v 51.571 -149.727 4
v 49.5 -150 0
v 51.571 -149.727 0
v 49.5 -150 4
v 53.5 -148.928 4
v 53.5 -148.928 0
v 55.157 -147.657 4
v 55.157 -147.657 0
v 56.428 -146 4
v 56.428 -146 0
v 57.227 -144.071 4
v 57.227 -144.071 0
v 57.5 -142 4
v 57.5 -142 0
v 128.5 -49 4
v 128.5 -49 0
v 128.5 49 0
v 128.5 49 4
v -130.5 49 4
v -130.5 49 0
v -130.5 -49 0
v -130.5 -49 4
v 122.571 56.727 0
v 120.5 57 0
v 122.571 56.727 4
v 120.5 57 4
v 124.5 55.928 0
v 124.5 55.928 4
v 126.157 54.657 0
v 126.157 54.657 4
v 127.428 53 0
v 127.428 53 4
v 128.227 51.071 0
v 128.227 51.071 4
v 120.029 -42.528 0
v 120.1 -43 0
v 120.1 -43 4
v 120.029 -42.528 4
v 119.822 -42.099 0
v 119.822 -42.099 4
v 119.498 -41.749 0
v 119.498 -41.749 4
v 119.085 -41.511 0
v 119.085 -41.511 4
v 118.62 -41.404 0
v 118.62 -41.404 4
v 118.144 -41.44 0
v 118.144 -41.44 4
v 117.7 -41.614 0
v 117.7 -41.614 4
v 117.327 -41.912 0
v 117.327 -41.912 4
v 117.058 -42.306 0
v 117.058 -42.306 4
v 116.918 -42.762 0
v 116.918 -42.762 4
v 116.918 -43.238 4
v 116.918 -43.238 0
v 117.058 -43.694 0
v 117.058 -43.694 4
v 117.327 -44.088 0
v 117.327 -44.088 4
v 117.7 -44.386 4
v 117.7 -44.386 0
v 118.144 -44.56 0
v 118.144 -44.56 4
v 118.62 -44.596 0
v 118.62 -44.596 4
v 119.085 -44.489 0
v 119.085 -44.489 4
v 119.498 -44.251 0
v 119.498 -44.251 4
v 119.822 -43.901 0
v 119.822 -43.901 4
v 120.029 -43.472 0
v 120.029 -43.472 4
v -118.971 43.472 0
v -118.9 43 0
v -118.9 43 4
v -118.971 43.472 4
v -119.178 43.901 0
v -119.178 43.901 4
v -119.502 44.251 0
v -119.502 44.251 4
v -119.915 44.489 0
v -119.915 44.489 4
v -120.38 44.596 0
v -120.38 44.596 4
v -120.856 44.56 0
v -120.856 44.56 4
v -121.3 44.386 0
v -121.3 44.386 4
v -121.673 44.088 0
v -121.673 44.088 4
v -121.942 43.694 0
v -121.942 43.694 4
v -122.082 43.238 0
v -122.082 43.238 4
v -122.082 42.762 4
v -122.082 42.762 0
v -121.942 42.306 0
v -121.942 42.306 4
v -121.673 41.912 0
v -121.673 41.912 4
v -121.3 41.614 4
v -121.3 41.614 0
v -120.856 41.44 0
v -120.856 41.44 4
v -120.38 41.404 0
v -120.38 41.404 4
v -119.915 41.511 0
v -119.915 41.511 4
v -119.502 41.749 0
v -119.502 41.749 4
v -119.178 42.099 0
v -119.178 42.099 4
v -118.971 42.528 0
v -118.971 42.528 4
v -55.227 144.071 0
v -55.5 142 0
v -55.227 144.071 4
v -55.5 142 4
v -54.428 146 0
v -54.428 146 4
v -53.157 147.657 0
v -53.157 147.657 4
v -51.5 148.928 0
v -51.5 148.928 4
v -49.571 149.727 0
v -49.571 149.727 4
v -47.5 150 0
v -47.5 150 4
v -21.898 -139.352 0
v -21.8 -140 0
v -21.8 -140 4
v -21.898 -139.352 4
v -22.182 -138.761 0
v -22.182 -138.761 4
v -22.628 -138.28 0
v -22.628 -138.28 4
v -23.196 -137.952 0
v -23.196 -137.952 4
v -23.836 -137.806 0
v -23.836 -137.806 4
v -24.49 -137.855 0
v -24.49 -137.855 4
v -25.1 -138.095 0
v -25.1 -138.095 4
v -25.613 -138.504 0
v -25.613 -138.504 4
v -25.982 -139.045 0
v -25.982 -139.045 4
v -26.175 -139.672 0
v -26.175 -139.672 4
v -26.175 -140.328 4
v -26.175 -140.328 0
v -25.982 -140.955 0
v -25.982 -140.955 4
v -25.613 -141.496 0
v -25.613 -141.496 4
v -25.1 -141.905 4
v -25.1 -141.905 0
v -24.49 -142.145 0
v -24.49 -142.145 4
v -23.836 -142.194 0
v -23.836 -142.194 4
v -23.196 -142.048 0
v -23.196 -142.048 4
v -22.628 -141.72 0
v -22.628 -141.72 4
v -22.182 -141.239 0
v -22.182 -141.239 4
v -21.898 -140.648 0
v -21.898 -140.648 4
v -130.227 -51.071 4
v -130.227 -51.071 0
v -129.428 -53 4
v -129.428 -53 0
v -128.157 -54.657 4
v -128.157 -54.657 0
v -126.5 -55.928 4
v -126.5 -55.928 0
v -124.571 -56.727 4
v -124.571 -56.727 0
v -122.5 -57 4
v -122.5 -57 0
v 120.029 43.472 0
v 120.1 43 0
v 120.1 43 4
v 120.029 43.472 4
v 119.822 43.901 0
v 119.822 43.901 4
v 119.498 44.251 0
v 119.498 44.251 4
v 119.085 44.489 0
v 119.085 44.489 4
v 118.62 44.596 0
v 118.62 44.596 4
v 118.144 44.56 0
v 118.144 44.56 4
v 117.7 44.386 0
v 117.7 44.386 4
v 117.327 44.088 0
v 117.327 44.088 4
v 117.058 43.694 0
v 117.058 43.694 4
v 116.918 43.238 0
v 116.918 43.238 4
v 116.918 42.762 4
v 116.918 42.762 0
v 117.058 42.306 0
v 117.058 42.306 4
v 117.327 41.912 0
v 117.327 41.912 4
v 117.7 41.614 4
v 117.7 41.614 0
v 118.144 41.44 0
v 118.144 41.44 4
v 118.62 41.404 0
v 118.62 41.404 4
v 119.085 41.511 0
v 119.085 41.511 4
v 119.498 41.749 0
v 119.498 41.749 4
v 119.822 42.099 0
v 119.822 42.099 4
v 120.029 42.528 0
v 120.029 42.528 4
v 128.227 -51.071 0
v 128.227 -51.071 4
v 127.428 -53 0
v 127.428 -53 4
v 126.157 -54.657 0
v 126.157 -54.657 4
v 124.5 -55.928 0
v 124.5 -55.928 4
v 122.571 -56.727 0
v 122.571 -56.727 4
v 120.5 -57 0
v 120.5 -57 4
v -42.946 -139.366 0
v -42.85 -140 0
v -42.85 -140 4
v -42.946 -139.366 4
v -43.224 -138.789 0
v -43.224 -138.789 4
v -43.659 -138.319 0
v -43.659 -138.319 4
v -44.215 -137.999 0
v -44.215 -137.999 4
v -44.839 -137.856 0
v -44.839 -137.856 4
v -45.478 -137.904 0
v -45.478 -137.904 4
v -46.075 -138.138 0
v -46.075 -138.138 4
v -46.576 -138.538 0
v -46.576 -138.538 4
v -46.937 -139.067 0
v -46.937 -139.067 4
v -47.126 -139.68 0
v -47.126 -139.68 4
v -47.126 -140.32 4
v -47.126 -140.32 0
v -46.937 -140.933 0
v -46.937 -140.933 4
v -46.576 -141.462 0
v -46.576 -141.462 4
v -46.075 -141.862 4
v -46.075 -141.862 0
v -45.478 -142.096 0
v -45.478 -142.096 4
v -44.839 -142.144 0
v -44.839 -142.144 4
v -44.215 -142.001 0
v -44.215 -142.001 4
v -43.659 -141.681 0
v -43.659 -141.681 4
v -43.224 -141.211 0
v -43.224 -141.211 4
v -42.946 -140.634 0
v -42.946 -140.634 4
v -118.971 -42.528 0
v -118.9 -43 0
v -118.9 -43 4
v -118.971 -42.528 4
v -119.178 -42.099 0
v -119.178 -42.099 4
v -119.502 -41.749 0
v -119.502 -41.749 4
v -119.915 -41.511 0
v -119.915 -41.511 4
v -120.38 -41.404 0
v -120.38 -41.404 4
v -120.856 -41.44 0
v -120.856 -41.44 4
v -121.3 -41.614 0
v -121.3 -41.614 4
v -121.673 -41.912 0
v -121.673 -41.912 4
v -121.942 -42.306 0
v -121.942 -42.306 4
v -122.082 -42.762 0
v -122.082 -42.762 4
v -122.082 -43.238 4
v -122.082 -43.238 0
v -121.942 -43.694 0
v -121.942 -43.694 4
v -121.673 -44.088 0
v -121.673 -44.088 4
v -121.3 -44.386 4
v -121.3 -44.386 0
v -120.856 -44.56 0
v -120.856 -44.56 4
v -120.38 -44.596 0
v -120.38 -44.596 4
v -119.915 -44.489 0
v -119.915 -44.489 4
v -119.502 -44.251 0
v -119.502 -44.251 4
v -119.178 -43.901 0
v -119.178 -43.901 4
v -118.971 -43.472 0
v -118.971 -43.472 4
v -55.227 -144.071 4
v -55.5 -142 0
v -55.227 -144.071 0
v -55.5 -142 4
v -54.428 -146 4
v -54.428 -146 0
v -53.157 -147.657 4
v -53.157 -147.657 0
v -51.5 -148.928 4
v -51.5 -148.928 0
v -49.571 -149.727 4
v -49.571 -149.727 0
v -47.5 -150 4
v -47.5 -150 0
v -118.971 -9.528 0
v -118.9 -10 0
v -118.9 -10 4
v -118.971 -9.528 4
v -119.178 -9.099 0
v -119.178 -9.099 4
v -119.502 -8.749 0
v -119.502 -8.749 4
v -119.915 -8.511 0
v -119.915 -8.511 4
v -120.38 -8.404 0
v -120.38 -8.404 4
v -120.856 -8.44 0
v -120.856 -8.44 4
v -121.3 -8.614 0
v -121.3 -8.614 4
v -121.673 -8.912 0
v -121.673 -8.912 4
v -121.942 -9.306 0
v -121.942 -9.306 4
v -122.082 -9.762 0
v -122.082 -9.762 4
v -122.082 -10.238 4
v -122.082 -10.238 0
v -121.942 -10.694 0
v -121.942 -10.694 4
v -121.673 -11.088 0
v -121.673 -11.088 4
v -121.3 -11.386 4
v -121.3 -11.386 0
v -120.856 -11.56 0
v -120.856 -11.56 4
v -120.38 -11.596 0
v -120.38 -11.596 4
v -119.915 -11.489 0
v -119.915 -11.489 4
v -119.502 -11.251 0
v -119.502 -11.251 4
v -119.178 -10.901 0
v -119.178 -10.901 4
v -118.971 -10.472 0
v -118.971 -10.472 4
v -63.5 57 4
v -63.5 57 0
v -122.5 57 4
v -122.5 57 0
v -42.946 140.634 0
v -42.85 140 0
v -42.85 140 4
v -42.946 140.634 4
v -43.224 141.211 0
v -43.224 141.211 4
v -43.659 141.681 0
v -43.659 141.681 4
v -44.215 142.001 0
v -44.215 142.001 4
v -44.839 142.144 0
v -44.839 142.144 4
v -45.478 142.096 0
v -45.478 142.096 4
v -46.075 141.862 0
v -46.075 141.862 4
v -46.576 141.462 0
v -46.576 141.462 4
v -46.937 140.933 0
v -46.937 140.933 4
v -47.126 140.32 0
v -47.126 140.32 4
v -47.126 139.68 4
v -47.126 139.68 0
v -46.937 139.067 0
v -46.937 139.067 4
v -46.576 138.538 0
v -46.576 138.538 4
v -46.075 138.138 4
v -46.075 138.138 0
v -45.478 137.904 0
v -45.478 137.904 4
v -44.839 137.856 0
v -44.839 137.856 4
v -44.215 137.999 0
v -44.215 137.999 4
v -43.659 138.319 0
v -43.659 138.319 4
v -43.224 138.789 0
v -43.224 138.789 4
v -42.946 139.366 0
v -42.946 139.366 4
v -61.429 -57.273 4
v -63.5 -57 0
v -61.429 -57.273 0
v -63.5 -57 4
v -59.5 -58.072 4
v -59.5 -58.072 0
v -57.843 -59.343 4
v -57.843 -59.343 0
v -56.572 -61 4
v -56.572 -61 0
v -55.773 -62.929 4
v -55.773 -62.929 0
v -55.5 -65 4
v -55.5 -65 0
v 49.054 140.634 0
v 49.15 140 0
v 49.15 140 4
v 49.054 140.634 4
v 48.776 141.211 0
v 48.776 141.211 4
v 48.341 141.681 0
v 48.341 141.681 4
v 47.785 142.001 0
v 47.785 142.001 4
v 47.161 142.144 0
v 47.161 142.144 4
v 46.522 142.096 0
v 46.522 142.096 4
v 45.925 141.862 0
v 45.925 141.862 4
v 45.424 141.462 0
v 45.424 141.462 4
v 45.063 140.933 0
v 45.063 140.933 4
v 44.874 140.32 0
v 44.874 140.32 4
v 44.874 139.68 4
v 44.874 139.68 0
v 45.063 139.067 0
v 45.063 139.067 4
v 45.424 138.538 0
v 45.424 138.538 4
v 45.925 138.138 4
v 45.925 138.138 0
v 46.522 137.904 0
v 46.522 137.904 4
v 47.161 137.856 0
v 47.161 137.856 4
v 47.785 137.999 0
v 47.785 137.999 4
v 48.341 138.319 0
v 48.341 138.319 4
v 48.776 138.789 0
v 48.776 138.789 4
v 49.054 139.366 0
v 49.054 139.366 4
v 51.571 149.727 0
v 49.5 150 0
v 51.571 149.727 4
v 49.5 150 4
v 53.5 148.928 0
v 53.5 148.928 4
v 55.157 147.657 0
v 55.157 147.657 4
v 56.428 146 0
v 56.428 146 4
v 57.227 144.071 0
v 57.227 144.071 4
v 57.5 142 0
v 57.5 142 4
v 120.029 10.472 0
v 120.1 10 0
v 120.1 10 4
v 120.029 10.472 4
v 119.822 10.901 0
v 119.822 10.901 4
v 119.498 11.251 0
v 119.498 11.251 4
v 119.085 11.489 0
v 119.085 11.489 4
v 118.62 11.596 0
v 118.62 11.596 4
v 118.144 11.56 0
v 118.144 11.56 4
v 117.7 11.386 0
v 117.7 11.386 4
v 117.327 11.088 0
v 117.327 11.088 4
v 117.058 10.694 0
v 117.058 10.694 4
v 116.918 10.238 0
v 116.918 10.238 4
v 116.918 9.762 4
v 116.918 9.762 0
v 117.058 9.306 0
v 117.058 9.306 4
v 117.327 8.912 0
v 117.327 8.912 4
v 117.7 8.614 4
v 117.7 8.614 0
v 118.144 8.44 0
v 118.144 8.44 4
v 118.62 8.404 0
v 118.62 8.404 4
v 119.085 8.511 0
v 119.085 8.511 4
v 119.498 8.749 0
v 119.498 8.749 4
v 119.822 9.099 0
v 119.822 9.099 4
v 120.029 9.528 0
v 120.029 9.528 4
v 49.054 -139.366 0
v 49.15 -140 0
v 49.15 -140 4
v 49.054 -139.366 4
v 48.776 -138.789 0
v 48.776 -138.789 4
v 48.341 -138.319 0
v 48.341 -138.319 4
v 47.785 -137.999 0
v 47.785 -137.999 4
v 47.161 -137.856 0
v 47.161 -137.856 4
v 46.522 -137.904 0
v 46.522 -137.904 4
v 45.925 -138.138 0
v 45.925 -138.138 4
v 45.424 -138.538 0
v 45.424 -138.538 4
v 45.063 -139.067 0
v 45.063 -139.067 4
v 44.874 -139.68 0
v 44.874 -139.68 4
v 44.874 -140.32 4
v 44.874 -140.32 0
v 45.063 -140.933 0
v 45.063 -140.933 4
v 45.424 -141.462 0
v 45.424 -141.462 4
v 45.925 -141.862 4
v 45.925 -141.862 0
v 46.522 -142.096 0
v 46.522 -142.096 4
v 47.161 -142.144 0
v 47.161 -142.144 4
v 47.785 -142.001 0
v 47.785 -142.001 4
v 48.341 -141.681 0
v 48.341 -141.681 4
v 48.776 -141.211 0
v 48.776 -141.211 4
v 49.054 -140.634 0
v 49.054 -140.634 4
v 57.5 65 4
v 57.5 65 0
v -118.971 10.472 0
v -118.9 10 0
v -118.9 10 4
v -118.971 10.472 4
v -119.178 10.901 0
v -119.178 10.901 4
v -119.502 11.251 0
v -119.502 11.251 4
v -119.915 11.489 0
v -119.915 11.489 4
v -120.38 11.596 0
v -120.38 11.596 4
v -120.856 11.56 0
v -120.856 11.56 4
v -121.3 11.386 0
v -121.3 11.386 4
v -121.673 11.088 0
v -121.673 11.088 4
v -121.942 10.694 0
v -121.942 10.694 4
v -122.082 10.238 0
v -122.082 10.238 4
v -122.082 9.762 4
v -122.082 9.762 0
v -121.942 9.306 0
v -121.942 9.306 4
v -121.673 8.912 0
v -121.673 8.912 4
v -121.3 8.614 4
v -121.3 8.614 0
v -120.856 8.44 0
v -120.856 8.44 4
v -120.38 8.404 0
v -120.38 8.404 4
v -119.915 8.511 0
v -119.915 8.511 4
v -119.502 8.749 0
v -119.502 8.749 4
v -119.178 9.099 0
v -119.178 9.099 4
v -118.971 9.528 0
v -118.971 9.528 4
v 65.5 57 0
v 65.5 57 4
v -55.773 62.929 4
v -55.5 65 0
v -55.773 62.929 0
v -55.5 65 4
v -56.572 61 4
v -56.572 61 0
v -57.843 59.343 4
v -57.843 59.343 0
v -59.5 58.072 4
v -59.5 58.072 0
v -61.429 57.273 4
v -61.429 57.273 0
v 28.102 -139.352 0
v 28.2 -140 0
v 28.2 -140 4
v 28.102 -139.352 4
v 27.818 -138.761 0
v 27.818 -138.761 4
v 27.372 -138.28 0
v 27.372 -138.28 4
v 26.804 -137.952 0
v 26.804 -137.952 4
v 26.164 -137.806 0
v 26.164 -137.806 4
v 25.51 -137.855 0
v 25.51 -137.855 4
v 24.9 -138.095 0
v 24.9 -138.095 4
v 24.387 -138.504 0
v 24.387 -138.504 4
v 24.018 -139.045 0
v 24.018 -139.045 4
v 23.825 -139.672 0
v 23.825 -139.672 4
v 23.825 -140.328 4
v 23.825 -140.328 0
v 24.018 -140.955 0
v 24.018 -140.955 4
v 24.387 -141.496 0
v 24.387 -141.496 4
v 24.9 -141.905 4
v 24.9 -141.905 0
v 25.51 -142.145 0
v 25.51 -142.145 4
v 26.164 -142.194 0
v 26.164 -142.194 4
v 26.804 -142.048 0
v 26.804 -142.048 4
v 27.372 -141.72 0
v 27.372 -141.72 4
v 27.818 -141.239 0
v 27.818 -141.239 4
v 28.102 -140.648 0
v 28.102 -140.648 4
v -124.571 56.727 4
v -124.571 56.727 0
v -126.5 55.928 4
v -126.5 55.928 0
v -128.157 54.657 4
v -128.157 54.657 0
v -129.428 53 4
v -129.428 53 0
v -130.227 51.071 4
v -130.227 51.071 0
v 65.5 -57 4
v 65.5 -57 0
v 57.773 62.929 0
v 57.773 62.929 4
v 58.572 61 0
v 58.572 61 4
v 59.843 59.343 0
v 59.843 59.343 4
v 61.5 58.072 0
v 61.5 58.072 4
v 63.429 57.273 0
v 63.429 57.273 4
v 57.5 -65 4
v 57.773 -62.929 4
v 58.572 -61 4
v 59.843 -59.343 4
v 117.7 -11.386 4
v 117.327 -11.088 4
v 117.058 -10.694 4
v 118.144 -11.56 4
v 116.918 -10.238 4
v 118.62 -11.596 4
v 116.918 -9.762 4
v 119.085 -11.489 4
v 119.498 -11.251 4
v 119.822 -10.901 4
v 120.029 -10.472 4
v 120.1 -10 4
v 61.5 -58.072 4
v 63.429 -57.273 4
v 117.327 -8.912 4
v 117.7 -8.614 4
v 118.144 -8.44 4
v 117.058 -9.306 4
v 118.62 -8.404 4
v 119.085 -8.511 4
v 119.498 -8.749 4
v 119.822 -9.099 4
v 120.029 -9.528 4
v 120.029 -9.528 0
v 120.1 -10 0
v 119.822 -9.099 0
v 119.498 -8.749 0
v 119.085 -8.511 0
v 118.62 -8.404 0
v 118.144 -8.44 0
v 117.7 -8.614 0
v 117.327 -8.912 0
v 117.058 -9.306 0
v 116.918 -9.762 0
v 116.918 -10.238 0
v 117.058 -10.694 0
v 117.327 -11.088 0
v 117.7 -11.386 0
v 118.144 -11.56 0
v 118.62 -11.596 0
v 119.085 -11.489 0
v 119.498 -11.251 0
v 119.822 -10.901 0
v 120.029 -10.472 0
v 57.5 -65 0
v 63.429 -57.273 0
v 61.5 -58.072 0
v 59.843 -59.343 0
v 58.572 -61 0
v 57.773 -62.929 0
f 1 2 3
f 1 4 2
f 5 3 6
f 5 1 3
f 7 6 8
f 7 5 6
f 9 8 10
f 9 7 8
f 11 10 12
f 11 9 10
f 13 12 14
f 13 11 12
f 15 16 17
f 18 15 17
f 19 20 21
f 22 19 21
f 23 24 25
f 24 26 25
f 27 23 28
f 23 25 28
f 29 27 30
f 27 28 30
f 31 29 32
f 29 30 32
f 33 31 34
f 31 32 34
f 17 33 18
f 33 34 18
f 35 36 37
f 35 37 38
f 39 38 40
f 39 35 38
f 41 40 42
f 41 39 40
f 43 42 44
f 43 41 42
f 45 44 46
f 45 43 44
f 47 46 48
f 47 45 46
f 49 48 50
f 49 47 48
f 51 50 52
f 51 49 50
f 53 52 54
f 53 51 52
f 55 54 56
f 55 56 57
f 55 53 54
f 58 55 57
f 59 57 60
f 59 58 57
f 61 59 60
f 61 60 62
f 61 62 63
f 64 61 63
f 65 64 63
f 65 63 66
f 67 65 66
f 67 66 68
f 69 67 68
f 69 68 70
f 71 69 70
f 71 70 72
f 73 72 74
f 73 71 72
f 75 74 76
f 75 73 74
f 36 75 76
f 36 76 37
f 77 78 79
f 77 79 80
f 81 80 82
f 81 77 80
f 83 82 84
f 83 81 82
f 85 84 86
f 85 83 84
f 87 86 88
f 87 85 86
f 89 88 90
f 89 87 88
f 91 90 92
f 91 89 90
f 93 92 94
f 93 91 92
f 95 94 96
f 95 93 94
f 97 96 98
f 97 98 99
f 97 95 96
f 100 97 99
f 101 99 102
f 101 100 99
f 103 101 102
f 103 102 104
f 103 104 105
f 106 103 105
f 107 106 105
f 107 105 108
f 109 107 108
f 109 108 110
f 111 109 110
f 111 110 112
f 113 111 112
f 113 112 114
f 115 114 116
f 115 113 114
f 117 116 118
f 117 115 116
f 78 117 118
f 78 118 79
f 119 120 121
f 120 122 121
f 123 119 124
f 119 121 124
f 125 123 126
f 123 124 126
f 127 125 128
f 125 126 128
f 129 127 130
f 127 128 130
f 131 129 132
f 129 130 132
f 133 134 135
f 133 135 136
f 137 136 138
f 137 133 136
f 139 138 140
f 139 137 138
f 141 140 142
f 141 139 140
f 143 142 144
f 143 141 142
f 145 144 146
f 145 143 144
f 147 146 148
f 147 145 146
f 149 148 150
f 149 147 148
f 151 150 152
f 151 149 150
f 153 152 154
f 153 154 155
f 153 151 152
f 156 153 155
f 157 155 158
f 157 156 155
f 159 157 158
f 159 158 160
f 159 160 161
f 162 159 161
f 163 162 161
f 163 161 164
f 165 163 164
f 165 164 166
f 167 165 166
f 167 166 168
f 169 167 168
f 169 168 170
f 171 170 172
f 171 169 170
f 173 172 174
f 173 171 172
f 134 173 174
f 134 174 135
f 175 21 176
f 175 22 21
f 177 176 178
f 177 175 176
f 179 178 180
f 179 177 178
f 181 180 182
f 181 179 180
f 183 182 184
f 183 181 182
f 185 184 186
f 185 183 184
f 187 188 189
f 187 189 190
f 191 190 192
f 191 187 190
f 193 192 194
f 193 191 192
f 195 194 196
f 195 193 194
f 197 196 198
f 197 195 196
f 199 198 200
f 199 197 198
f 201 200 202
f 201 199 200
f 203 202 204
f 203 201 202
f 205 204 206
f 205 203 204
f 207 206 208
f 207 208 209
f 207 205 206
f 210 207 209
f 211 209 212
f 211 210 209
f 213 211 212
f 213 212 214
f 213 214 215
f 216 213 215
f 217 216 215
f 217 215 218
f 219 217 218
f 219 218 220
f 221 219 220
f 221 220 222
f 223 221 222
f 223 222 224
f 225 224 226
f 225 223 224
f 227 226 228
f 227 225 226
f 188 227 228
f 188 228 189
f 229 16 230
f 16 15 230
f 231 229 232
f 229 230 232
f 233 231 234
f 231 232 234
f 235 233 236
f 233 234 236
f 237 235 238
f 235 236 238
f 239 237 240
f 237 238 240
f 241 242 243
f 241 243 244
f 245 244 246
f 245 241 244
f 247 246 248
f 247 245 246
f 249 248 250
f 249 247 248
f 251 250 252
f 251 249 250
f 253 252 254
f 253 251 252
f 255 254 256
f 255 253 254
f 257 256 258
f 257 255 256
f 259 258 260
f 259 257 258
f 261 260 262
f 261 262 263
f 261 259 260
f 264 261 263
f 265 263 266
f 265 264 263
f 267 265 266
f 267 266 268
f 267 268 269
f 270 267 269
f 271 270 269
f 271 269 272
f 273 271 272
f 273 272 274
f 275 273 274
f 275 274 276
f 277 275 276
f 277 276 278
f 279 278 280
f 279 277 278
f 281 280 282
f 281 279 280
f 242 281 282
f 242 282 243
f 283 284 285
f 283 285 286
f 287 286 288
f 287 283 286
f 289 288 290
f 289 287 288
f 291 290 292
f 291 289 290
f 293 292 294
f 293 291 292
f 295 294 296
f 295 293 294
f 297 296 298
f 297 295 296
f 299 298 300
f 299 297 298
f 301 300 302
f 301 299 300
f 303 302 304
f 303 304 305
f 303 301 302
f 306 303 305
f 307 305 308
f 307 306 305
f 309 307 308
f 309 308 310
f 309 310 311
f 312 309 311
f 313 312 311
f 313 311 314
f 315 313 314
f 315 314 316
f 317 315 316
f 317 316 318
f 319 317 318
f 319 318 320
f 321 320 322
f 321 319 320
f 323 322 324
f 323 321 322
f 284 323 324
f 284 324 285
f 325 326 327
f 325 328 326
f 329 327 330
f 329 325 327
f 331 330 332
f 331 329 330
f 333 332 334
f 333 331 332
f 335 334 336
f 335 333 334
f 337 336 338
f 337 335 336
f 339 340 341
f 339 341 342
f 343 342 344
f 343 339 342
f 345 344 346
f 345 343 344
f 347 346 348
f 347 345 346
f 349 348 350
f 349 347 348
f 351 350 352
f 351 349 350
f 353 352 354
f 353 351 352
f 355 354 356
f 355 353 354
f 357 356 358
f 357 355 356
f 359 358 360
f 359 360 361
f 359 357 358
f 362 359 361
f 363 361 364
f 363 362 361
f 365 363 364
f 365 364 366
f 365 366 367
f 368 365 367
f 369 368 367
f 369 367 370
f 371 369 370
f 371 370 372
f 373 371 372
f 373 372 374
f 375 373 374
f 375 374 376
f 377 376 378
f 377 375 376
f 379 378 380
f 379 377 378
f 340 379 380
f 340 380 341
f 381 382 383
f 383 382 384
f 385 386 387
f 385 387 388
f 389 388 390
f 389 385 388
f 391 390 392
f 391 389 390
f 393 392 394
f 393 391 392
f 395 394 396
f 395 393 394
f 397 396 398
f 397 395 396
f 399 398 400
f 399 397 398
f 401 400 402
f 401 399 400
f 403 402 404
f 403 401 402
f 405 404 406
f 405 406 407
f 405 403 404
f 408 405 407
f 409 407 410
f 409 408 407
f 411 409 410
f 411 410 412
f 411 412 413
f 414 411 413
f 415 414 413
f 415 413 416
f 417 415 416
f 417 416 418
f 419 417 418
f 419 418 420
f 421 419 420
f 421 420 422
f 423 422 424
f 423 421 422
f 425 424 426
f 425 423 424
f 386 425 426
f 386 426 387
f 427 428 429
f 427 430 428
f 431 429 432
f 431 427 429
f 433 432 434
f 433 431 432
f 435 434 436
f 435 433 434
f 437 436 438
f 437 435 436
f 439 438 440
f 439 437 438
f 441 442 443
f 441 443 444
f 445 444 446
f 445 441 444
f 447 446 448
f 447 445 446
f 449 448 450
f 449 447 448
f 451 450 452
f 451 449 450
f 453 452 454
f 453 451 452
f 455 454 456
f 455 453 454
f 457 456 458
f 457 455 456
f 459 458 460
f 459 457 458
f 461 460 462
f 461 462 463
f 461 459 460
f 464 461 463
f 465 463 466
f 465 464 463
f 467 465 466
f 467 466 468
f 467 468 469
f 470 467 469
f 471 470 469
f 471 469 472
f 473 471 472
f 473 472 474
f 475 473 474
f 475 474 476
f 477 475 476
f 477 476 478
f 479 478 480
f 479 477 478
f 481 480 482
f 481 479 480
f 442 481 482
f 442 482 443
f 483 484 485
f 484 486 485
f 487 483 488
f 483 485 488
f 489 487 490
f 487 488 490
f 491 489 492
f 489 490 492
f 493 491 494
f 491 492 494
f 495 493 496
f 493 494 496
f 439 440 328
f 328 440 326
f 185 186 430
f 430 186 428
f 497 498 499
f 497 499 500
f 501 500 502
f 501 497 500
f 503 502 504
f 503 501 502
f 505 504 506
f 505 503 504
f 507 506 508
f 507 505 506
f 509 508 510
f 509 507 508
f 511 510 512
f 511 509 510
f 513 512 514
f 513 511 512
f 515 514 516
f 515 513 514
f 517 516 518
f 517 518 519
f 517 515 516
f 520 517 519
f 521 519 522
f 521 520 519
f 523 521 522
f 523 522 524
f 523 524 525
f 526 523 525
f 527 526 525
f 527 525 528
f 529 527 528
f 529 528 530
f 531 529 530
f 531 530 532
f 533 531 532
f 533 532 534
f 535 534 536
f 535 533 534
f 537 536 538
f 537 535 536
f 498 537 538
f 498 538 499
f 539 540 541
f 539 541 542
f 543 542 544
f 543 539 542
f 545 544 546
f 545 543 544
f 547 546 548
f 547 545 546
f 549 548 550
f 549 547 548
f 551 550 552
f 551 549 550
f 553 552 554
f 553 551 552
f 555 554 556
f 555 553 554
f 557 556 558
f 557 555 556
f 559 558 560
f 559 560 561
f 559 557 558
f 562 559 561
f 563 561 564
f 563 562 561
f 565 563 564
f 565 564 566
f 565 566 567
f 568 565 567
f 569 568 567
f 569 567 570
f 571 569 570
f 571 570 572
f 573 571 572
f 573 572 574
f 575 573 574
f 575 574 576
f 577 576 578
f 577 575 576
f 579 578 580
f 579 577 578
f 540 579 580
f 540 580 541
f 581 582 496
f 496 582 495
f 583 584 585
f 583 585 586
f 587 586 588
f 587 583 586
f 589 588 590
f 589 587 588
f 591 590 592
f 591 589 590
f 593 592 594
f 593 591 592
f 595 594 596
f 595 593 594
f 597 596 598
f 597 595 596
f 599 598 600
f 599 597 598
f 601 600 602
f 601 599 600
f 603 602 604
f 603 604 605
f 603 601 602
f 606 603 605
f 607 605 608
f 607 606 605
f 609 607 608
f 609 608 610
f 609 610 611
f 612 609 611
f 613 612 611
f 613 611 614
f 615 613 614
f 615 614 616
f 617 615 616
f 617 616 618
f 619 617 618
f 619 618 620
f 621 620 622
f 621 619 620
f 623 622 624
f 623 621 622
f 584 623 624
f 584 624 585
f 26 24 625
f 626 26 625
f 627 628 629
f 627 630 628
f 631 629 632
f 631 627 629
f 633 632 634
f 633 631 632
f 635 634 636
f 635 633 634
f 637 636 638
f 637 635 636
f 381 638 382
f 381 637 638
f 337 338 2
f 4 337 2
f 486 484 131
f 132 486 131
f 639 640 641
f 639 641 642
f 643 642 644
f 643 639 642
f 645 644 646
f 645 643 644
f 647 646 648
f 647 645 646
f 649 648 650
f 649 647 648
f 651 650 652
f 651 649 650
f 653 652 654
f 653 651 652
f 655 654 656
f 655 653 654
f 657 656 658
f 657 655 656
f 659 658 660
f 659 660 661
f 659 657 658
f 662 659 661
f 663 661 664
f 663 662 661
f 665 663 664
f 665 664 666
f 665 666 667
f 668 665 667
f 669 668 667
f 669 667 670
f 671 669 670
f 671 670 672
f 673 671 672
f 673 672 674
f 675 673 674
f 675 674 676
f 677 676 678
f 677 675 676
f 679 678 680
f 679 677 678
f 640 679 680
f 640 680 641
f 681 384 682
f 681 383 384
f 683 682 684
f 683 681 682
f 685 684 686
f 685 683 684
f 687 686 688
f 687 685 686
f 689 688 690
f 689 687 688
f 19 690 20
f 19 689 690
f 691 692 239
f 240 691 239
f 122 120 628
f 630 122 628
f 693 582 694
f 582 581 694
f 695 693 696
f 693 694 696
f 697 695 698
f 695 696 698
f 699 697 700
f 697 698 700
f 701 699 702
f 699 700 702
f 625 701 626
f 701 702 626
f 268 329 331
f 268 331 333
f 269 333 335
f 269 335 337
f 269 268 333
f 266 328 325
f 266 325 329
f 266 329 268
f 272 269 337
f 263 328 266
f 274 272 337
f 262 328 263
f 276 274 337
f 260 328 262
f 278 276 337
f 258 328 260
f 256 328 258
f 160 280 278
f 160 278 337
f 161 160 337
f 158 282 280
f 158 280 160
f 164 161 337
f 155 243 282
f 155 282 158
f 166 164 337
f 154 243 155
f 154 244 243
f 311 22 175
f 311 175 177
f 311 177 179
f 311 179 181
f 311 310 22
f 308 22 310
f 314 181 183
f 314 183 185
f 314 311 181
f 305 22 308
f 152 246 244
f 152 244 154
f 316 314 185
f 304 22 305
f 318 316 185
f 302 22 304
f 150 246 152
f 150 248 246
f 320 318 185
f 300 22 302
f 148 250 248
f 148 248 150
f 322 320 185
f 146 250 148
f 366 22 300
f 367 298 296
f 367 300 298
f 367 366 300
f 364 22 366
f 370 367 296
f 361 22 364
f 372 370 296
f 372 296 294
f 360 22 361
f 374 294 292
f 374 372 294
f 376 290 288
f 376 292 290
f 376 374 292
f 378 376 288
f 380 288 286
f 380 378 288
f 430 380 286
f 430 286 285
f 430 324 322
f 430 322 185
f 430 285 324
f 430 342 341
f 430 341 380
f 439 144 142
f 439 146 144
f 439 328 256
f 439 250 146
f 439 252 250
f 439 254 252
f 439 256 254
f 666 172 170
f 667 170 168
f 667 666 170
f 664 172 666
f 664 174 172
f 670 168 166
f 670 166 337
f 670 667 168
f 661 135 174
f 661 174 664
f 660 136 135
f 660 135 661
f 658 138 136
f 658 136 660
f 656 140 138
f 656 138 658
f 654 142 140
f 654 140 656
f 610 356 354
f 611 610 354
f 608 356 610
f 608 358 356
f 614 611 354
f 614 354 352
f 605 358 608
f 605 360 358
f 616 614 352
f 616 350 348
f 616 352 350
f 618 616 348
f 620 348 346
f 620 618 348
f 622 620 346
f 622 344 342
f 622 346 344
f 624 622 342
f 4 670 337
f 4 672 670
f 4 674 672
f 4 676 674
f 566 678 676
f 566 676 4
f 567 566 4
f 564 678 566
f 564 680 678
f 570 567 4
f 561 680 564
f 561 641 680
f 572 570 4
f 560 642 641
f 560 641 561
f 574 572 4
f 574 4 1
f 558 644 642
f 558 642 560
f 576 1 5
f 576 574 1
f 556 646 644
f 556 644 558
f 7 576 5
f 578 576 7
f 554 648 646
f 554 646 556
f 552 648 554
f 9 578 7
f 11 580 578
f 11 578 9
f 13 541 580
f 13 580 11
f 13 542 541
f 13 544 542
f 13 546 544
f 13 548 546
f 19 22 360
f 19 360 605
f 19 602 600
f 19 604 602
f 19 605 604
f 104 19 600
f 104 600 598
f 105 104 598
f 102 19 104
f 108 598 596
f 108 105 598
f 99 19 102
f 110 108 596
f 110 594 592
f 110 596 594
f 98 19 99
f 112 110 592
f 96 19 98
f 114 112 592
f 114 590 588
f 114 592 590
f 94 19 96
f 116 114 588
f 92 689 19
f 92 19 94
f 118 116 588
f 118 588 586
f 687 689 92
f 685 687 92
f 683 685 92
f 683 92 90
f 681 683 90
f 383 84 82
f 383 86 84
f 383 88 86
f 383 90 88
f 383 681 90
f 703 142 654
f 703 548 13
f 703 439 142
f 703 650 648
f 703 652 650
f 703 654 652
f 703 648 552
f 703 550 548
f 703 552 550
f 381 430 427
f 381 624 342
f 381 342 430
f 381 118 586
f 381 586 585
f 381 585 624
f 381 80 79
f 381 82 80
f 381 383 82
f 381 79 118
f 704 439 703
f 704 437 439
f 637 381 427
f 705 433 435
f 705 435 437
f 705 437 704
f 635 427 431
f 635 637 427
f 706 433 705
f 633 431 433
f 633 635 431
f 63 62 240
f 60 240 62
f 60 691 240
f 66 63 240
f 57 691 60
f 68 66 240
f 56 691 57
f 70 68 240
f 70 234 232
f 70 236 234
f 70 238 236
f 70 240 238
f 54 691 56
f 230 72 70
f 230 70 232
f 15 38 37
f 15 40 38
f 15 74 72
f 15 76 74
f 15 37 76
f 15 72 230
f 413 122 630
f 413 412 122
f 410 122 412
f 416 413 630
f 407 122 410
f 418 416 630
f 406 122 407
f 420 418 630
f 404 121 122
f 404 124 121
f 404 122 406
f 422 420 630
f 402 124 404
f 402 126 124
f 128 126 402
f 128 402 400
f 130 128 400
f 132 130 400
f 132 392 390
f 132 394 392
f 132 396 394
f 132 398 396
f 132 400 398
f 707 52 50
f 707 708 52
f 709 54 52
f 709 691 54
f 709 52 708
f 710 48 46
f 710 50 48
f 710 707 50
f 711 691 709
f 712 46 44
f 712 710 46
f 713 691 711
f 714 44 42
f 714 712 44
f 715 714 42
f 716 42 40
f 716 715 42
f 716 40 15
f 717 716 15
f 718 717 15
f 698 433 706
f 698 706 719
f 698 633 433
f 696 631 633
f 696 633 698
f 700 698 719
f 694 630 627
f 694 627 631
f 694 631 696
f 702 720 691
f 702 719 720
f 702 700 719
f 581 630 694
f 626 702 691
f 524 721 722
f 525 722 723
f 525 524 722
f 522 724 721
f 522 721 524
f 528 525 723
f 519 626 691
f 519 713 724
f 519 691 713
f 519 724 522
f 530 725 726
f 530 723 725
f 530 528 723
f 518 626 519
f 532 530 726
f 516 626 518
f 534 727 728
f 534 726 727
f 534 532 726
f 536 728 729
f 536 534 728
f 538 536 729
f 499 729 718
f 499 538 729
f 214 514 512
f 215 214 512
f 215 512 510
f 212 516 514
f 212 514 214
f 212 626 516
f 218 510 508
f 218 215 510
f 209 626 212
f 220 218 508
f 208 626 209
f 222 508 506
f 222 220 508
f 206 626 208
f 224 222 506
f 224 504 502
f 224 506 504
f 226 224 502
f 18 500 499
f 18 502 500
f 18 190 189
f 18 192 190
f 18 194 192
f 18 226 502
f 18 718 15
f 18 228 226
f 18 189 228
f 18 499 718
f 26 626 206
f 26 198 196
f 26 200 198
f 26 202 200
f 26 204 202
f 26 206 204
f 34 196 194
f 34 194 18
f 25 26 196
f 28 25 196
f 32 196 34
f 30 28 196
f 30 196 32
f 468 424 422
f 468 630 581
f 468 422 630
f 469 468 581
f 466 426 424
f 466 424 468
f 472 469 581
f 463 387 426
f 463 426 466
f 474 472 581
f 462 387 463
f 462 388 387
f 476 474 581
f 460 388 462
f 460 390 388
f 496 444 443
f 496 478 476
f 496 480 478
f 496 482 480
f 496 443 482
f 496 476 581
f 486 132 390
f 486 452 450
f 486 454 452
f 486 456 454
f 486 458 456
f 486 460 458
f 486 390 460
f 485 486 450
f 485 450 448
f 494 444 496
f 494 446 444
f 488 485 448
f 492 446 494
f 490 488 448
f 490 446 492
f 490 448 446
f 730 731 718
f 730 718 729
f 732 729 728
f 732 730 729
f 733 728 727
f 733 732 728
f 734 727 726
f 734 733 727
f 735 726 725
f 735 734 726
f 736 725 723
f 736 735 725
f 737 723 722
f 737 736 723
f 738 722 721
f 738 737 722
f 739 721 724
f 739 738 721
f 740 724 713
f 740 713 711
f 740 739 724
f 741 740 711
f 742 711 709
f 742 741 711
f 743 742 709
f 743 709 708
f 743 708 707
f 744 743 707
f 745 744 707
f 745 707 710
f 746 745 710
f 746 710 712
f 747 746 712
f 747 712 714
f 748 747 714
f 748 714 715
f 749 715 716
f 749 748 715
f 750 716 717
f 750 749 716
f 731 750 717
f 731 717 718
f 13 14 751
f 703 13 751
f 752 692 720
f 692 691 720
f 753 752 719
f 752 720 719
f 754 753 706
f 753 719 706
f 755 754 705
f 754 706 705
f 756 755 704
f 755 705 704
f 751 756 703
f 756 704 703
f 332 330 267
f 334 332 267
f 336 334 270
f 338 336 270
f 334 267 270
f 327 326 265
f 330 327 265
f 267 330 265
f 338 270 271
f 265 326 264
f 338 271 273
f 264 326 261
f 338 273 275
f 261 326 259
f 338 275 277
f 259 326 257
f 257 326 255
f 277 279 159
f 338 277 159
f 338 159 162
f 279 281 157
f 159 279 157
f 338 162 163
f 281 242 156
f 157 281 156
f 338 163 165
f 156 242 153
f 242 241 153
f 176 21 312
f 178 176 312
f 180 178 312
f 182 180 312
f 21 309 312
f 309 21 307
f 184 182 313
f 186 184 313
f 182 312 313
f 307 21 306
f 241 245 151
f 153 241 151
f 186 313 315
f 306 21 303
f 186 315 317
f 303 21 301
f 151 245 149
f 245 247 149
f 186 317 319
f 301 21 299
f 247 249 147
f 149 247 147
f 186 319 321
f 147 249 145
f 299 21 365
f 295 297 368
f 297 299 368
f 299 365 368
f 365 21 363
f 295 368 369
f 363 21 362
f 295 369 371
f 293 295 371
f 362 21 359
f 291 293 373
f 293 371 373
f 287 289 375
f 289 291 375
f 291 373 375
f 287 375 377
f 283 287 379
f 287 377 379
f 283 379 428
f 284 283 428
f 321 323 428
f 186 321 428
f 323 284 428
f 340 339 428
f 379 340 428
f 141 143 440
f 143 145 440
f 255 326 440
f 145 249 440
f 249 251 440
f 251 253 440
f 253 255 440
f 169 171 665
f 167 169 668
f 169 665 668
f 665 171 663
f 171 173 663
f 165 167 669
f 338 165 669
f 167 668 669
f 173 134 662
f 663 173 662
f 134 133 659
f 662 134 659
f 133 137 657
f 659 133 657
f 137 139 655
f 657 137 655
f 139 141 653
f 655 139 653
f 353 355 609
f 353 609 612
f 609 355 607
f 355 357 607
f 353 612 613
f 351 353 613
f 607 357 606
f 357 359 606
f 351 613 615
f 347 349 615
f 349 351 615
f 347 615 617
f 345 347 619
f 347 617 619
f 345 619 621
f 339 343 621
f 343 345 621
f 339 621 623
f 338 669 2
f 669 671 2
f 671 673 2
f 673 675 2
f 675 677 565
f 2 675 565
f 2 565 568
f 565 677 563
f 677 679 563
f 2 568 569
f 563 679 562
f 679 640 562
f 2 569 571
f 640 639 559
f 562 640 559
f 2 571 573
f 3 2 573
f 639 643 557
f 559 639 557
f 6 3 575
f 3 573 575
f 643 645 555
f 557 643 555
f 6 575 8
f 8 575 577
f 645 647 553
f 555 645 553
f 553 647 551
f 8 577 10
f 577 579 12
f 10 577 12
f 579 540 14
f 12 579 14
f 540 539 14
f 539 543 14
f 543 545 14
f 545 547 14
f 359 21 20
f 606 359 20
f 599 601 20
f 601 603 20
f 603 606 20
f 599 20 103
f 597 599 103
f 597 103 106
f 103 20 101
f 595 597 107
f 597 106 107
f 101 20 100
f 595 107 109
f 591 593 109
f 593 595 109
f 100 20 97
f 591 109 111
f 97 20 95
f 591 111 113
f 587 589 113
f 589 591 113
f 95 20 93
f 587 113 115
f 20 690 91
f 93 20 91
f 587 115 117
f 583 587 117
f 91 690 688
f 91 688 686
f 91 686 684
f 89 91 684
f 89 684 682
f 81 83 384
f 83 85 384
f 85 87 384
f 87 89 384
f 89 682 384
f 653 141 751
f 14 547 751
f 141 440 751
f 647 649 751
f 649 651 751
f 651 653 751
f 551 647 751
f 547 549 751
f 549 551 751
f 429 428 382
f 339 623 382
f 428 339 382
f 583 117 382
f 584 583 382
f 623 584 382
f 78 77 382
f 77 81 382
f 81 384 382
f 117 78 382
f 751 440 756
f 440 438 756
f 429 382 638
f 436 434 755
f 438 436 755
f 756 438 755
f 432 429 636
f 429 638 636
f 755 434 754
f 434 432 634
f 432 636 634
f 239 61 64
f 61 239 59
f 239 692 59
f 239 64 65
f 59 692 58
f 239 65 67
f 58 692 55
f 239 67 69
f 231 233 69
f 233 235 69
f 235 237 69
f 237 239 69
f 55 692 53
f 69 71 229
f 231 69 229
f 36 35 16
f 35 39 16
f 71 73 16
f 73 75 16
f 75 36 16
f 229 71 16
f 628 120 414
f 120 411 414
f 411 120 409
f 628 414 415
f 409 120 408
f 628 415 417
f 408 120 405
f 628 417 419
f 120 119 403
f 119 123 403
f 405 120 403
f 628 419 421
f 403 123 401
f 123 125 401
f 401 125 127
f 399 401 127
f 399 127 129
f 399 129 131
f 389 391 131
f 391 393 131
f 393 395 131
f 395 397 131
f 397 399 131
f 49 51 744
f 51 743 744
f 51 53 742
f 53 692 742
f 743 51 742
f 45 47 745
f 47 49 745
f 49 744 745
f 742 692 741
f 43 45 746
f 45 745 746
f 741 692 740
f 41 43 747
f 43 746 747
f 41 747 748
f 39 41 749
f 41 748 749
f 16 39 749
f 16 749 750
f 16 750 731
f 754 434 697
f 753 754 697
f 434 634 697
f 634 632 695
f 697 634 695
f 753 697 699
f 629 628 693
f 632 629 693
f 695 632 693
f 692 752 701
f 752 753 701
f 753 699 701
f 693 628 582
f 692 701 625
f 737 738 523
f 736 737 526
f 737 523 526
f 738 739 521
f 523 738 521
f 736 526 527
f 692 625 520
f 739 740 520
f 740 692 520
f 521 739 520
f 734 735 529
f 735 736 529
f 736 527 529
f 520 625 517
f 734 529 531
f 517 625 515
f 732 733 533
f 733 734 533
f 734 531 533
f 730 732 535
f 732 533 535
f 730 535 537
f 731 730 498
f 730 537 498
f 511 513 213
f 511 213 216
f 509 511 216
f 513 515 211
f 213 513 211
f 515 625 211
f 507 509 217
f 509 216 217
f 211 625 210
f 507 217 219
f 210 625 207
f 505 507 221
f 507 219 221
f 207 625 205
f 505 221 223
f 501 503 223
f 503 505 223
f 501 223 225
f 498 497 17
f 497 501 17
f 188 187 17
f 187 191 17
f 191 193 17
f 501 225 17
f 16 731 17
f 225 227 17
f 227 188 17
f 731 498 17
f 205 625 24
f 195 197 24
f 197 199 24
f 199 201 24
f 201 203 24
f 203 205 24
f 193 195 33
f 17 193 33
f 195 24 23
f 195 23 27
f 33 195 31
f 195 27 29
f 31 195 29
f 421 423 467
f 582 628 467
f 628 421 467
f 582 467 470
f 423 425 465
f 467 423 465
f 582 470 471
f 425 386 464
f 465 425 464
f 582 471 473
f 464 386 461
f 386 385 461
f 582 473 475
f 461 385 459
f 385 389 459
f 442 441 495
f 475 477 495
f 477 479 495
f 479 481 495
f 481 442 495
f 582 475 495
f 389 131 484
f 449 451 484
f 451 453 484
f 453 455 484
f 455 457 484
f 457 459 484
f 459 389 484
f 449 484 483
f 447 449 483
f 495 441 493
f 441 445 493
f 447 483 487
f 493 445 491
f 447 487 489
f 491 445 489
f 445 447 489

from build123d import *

# Parameters (mm, degrees)
SKETCH_281X300_25_R   = 2.15
SKETCH_281X300_25_R_2 = 2.2
SKETCH_281X300_25_R_3 = 1.6
F_4MM_DEPTH           = 4
FILLET_1_R            = 8


with BuildPart() as part:
    # Sketch 281x300__25 → 4mm (new body)
    with BuildSketch(Plane.XY):
        Polygon((-55.5, 150), (-55.5, 57), (-130.5, 57), (-130.5, -57), (-55.5, -57), (-55.5, -150), (57.5, -150), (57.5, -57), (128.5, -57), (128.5, 57), (57.5, 57), (57.5, 150), align=None)
        with Locations((-45, 140)):
            Circle(SKETCH_281X300_25_R, mode=Mode.SUBTRACT)
        with Locations((26, -140)):
            Circle(SKETCH_281X300_25_R_2, mode=Mode.SUBTRACT)
        with Locations((-24, -140)):
            Circle(SKETCH_281X300_25_R_2, mode=Mode.SUBTRACT)
        with Locations((118.5, 10)):
            Circle(SKETCH_281X300_25_R_3, mode=Mode.SUBTRACT)
        with Locations((118.5, -10)):
            Circle(SKETCH_281X300_25_R_3, mode=Mode.SUBTRACT)
        with Locations((-120.5, 10)):
            Circle(SKETCH_281X300_25_R_3, mode=Mode.SUBTRACT)
        with Locations((-120.5, -10)):
            Circle(SKETCH_281X300_25_R_3, mode=Mode.SUBTRACT)
        with Locations((118.5, 43)):
            Circle(SKETCH_281X300_25_R_3, mode=Mode.SUBTRACT)
        with Locations((118.5, -43)):
            Circle(SKETCH_281X300_25_R_3, mode=Mode.SUBTRACT)
        with Locations((-120.5, 43)):
            Circle(SKETCH_281X300_25_R_3, mode=Mode.SUBTRACT)
        with Locations((-120.5, -43)):
            Circle(SKETCH_281X300_25_R_3, mode=Mode.SUBTRACT)
        with Locations((47, 140)):
            Circle(SKETCH_281X300_25_R, mode=Mode.SUBTRACT)
        with Locations((-45, -140)):
            Circle(SKETCH_281X300_25_R, mode=Mode.SUBTRACT)
        with Locations((47, -140)):
            Circle(SKETCH_281X300_25_R, mode=Mode.SUBTRACT)
    extrude(amount=F_4MM_DEPTH)

    # Fillet 1
    fillet_1_edges = [part.edges().sort_by_distance(p)[0] for p in [
        (-130.5, 57, 2),
        (-55.5, 57, 2),
        (-55.5, 150, 2),
        (57.5, 150, 2),
        (57.5, 57, 2),
        (128.5, 57, 2),
        (128.5, -57, 2),
        (57.5, -57, 2),
        (57.5, -150, 2),
        (-55.5, -150, 2),
        (-55.5, -57, 2),
        (-130.5, -57, 2),
    ]]
    fillet(fillet_1_edges, radius=FILLET_1_R)


solid = part.part
